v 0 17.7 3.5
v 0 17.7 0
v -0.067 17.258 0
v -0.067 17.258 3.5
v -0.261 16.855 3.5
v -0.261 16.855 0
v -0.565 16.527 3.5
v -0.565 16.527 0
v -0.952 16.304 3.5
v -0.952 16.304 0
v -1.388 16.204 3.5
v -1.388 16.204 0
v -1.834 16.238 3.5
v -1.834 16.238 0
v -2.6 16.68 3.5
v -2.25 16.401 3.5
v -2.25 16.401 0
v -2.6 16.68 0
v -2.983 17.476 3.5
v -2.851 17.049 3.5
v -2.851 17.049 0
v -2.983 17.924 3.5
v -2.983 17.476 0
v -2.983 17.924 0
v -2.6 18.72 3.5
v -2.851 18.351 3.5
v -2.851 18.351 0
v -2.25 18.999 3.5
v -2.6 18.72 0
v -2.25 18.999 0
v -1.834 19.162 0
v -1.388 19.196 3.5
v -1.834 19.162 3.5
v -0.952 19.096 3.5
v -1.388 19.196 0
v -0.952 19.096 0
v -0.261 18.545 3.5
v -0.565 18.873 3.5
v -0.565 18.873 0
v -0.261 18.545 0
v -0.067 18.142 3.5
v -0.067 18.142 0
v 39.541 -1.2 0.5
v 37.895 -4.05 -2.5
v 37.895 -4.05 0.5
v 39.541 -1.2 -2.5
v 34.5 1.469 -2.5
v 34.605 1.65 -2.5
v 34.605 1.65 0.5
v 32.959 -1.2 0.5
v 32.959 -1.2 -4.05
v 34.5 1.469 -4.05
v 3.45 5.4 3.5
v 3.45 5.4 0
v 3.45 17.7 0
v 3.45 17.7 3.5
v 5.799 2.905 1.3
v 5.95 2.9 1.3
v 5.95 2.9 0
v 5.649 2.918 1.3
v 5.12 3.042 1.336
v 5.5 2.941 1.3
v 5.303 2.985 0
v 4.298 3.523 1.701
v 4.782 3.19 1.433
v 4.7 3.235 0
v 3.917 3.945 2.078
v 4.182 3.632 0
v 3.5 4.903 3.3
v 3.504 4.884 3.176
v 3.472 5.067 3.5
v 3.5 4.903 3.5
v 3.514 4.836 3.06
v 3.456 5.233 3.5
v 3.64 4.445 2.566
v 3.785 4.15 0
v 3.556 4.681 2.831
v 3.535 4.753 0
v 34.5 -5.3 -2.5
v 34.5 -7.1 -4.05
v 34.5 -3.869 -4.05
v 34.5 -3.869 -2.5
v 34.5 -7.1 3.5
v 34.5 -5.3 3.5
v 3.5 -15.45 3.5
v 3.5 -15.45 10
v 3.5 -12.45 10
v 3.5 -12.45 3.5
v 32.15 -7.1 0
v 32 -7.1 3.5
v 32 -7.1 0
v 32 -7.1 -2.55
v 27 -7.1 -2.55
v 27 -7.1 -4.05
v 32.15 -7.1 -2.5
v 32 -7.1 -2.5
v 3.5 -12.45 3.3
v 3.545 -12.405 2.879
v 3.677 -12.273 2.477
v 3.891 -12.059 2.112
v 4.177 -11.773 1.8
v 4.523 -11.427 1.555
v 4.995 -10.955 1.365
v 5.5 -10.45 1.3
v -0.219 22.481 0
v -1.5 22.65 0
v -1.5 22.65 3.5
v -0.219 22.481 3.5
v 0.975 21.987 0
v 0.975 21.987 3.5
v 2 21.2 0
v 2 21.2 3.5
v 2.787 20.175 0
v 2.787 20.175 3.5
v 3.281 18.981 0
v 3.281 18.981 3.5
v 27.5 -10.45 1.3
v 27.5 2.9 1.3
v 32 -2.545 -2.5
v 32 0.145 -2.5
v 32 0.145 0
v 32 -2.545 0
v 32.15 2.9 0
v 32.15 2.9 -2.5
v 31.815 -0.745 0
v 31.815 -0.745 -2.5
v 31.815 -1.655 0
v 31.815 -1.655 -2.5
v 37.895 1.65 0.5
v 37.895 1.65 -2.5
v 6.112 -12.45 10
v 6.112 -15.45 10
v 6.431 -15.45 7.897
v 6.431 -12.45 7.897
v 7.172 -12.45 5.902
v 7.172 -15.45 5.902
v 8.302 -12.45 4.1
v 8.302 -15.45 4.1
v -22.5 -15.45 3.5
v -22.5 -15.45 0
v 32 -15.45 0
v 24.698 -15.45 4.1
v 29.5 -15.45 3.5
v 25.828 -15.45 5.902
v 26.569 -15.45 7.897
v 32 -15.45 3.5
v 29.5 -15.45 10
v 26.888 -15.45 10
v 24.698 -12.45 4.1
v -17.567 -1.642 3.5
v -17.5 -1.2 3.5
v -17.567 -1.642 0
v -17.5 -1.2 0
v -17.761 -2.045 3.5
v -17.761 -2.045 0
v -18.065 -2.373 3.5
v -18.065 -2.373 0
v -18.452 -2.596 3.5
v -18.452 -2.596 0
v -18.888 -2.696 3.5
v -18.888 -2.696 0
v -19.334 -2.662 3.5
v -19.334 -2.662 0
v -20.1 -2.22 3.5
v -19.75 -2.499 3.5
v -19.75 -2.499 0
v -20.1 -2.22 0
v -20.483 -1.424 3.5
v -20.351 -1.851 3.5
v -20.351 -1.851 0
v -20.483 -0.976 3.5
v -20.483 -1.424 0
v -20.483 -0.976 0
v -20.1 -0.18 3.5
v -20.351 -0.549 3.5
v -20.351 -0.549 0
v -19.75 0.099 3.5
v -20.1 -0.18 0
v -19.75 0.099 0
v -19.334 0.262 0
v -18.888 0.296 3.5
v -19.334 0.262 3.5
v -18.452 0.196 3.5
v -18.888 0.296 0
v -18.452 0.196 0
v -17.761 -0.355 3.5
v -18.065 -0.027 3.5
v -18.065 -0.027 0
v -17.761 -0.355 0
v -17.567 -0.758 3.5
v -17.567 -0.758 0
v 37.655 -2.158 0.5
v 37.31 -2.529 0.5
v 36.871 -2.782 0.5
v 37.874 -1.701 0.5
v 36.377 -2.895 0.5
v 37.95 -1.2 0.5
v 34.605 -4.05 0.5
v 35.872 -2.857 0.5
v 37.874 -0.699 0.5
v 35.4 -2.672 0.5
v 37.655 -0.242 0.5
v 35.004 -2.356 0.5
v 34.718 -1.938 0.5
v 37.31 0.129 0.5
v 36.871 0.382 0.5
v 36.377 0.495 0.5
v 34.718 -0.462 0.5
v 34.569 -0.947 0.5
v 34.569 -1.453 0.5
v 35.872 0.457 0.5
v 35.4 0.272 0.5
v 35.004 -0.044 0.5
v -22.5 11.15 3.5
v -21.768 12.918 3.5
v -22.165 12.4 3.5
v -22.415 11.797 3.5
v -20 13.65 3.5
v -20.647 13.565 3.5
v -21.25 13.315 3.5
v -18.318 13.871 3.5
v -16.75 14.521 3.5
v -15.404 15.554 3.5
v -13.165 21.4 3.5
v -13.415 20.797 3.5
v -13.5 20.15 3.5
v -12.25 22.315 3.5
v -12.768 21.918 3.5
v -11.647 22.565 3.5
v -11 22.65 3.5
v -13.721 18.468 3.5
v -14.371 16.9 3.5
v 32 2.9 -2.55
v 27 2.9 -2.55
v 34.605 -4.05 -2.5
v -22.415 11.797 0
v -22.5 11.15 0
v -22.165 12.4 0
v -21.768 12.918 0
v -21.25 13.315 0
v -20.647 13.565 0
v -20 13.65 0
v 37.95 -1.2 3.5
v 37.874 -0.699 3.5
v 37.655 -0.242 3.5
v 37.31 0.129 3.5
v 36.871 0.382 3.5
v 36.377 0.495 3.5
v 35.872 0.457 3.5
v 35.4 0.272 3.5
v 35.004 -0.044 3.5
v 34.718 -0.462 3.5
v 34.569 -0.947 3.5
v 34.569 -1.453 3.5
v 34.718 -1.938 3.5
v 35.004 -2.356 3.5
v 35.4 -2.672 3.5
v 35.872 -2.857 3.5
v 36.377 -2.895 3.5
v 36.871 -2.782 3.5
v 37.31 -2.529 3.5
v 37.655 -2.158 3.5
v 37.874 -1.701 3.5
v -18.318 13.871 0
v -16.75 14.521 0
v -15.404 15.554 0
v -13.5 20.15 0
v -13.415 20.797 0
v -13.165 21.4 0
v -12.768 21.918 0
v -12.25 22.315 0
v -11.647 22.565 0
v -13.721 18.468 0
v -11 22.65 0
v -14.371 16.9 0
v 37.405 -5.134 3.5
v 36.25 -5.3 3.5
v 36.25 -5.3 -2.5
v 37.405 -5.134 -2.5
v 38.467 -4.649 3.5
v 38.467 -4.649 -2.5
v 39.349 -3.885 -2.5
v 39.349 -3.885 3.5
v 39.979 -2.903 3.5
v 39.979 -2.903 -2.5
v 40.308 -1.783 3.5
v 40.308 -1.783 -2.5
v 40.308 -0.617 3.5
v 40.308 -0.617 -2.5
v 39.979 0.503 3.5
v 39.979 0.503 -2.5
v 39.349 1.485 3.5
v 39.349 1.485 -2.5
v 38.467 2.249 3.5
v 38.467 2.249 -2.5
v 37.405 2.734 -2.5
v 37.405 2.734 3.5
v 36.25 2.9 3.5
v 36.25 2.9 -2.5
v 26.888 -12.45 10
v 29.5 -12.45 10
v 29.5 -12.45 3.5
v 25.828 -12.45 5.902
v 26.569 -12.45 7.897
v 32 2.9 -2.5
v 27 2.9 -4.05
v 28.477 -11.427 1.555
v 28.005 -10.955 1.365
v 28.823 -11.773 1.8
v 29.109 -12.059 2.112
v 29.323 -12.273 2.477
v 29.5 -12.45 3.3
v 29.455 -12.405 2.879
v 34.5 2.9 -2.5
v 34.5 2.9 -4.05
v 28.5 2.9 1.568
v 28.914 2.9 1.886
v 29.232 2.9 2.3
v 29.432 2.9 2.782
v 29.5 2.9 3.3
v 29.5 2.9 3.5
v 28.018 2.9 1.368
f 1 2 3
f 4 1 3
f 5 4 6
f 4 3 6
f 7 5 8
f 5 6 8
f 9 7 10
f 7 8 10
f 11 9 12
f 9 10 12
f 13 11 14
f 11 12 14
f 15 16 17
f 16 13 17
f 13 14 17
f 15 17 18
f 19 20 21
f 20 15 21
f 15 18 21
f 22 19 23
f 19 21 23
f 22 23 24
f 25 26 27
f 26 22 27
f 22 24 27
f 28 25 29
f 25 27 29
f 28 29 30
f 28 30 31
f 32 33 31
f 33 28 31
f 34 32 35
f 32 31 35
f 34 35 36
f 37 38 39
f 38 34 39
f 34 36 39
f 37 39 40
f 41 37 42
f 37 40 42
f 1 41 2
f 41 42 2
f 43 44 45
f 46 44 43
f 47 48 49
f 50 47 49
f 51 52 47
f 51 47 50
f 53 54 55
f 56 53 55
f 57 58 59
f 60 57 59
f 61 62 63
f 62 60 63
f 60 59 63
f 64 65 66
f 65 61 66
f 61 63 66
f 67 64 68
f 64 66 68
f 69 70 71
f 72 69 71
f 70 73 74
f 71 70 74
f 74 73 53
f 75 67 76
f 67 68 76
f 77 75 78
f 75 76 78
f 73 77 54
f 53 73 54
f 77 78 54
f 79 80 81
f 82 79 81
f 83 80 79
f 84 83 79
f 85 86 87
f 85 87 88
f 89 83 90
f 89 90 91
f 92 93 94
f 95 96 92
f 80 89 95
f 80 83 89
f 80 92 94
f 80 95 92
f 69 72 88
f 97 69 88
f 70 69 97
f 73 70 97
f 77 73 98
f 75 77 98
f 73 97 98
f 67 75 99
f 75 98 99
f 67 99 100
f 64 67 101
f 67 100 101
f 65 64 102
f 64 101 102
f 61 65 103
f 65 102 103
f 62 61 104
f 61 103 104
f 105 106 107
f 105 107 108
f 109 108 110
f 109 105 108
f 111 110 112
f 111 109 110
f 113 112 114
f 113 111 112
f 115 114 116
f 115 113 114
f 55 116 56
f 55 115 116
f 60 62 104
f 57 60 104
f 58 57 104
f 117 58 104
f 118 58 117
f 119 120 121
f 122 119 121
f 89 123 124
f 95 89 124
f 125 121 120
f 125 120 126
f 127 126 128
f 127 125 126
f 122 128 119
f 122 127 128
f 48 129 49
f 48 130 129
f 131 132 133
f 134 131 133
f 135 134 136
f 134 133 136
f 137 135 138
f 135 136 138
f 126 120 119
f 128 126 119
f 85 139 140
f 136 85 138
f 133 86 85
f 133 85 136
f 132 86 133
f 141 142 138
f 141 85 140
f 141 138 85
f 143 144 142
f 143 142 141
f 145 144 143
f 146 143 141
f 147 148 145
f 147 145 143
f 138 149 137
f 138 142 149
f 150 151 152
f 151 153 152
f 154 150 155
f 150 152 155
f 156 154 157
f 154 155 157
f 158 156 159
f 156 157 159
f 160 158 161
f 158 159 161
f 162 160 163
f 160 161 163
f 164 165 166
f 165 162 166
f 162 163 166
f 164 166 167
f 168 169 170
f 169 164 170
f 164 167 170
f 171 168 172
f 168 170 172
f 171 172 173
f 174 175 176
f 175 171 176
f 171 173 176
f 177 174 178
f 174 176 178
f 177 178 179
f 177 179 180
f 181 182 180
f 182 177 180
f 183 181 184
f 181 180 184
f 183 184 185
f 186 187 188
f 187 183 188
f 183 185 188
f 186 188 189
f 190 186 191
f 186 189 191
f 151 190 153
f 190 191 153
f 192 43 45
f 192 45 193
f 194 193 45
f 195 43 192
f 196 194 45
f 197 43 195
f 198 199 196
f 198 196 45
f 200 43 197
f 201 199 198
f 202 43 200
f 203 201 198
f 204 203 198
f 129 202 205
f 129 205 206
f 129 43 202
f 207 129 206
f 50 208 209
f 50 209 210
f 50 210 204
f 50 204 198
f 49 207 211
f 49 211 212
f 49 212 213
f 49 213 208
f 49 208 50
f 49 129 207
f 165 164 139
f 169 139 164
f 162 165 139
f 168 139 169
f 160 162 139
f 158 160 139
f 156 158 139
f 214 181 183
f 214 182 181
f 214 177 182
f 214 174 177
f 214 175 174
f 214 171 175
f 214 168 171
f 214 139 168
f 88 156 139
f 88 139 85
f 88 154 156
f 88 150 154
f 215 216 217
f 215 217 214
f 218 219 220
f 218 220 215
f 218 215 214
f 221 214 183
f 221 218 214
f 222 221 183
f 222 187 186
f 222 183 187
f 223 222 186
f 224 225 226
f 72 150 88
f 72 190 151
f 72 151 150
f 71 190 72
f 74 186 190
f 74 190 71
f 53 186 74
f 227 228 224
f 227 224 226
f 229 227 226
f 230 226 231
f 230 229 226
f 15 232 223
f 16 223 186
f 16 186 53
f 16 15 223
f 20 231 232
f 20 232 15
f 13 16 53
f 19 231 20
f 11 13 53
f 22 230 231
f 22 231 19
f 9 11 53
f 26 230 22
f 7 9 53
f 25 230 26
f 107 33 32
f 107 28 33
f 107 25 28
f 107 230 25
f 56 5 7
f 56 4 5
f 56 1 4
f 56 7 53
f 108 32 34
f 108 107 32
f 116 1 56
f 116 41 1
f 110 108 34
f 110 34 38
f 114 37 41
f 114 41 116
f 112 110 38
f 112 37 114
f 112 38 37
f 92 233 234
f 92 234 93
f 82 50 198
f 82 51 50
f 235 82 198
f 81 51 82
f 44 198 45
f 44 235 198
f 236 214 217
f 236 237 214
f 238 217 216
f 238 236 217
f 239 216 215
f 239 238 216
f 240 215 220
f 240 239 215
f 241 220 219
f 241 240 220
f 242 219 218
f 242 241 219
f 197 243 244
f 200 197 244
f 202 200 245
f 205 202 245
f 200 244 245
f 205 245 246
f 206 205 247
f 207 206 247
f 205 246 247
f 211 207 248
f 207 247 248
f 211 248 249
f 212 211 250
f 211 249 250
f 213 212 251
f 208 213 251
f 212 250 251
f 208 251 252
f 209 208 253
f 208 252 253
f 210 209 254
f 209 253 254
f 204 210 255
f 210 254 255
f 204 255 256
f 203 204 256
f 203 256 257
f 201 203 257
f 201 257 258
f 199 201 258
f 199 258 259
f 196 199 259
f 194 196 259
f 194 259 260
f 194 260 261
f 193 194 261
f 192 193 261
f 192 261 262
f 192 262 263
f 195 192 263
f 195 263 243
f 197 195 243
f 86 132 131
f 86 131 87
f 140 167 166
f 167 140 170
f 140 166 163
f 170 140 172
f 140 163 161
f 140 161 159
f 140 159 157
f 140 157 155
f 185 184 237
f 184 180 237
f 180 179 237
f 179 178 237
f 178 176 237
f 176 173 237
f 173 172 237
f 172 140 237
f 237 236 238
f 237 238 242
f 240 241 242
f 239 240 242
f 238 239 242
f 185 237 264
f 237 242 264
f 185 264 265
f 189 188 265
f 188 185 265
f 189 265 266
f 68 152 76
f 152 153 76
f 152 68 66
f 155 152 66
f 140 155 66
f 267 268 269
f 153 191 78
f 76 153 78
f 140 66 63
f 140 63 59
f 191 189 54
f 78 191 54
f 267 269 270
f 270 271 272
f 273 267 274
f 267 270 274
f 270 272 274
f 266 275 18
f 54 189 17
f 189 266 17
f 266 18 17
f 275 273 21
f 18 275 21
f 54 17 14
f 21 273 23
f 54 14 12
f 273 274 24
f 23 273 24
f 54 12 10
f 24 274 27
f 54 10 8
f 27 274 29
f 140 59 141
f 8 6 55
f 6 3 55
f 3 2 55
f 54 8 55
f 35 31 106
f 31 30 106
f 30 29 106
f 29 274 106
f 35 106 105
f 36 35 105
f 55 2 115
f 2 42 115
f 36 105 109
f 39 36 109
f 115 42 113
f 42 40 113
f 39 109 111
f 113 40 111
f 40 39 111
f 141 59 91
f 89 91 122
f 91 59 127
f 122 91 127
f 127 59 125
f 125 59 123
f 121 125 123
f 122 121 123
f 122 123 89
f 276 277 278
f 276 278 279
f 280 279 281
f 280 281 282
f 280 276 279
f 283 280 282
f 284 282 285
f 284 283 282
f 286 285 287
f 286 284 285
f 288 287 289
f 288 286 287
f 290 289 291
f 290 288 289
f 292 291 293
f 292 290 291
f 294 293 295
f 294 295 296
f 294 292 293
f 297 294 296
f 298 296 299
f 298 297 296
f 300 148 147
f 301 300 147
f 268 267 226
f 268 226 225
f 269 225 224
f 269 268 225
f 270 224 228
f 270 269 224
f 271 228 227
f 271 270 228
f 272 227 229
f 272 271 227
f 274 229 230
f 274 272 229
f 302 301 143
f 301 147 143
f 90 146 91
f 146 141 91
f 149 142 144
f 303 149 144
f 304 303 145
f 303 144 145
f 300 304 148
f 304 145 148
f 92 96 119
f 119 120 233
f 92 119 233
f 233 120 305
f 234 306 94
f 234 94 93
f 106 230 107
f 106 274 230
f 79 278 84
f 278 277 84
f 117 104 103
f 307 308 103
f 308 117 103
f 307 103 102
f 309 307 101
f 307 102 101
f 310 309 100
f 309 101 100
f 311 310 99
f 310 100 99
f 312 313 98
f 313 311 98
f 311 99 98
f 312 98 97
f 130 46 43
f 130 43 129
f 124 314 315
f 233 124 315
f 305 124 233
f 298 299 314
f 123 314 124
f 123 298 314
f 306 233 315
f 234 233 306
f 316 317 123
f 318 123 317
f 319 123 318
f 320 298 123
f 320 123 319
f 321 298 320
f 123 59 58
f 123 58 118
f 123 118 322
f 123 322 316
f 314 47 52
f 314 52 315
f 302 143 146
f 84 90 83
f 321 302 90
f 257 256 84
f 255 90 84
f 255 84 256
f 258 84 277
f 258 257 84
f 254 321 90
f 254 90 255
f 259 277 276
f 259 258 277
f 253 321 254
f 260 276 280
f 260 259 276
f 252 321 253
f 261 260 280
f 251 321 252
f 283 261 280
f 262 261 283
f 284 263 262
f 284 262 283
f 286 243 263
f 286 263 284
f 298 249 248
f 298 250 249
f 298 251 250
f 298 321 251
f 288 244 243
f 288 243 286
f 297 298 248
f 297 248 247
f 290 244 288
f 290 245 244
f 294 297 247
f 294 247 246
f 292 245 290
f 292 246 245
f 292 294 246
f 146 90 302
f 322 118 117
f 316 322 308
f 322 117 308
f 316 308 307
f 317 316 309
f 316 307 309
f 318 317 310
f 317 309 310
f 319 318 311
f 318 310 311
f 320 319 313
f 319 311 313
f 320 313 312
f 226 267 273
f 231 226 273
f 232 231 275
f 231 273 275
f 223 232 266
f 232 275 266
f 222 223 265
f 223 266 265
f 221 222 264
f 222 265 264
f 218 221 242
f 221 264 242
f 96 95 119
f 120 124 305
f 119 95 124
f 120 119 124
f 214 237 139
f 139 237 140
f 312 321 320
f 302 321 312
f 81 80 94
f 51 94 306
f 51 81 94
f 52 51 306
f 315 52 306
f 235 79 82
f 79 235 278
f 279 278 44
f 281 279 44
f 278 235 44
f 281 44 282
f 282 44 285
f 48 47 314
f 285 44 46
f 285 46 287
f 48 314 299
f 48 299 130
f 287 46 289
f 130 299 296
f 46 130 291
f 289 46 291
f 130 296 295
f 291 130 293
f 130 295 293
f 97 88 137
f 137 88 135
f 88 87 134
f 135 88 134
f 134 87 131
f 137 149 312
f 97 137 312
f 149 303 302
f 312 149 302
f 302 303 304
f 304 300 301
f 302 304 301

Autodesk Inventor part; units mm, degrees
ref_plane "YZ Plane" through (0, 0, 0) normal (1, 0, 0) x (0, 1, 0)
ref_plane "XZ Plane" through (0, 0, 0) normal (0, 1, 0) x (-1, 0, 0)
ref_plane "XY Plane" through (0, 0, 0) normal (0, 0, 1) x (1, 0, 0)
sketch "Sketch1" plane through (0, 0, 0) normal (0, 0, 1) x (1, 0, 0)
  arc A0 (-20, 13.65) -> (-13.5, 20.15) centre (-20, 20.15) ccw
  circle A1 centre (-20, 20.15) radius 4.5 projected
  arc A2 (-20, 13.65) -> (-22.5, 11.15) centre (-20, 11.15) ccw
  line L0 (-22.5, 11.15) -> (-22.5, -15.45)
  circle A3 centre (-19, -1.2) radius 1.5 projected
  line L1 (-22.5, -15.45) -> (-15, -15.45)
  line L2 (34.5, -7.1) -> (34.5, 2.9)
  line L3 (34.5, 2.9) -> (32, 2.9)
  arc A4 (3.45, 17.7) -> (-1.5, 22.65) centre (-1.5, 17.7) ccw
  circle A5 centre (-1.5, 17.7) radius 1.5 projected
  arc A6 (-11, 22.65) -> (-13.5, 20.15) centre (-11, 20.15) ccw
  line L4 (-11, 22.65) -> (-1.5, 22.65)
  arc A7 (3.45, 5.4) -> (5.95, 2.9) centre (5.95, 5.4) ccw
  line L5 (3.45, 5.4) -> (3.45, 17.7)
  circle A8 centre (23.5, 7.6) radius 2.7 projected
  line L6 (-15, -15.45) -> (32, -15.45)
  line L7 (32, 20.05) -> (32, 2.9) construction
  line L8 (32, 2.9) -> (5.95, 2.9)
  line L9 (32, -15.45) -> (32, -7.1)
  line L10 (32, -7.1) -> (34.5, -7.1)
  point P0 (0, 0)
  point P1 (-32, -15.45)
  dimension "d0" = 90
  dimension "d1" = 90
  dimension "d2" = 2
  dimension "d3" = 3.5
  dimension "d5" = 90
  dimension "d6" = 90
  dimension "d7" = 4.7
  dimension "d51" = 2.5
  dimension "d52" = 10
extrude "Extrusion1" add sketch "Sketch1" along normal blind 3.5 contours A0 A6 L4 A4 L5 A7 L8 L3 L2 L10 L9 L6 L1 L0 A2
sketch "Sketch2" plane through (0, 0, 3.5) normal (0, 0, 1) x (1, 0, 0)
  line L0 (29.5, 12.55) -> (29.5, -12.45)
  line L1 (29.5, -12.45) -> (3.5, -12.45)
  line L2 (29.5, 12.55) -> (3.5, 12.55)
  line L3 (3.5, 12.55) -> (3.5, -12.45)
  point P0 (0, 0)
  point P1 (6.5, -20.5)
  point P2 (26.5, -20.5)
  point P3 (32, -15.45)
  dimension "d14" = 3
  dimension "d15" = 3
  dimension "d16" = 25
  dimension "d53" = 2.5
  dimension "d54" = 3
extrude "Extrusion2" cut sketch "Sketch2" against normal blind 2.2
fillet "Fillet1" radius 2 3 edges at (16.5, -12.45, 1.3) (3.5, -3.7737, 1.3) (29.5, -4.775, 1.3)
sketch "Sketch3" plane through (-15, -15.45, 0) normal (0, -1, 0) x (1, 0, 0)
  circle A0 centre (31.5, 10.5) radius 4.3 construction
  line L0 (39.5, 4.5) -> (23.5, 4.5) projected
  arc A1 (39.5, 4.5) -> (39.5, 16.5) centre (31.5, 10.5) ccw projected
  line L1 (23.5, 16.5) -> (39.5, 16.5) projected
  arc A2 (23.5, 16.5) -> (23.5, 4.5) centre (31.5, 10.5) ccw projected
  line L2 (39.6976, 16.9) -> (23.3024, 16.9) construction
  line L3 (39.6976, 4.1) -> (23.3024, 4.1)
  arc A3 (39.6976, 4.1) -> (41.888, 10) centre (31.5, 10.5) ccw
  arc A4 (23.3024, 16.9) -> (21.1, 10.5) centre (31.5, 10.5) ccw construction
  line L4 (41.9, 3.5) -> (21.1, 3.5)
  line L5 (21.1, 3.5) -> (21.1, 10.5) construction
  line L6 (41.9, 3.5) -> (41.9, 10.5) construction
  arc A5 (41.9, 10.5) -> (39.6976, 16.9) centre (31.5, 10.5) ccw construction
  arc A6 (21.1, 10.5) -> (21.112, 10) centre (31.5, 10.5) ccw construction
  line L7 (21.1, 10.5) -> (18.5, 10.5) construction
  line L8 (18.5, 10.5) -> (18.5, 10) construction
  line L9 (18.5, 3.5) -> (21.1, 3.5)
  line L10 (41.9, 10.5) -> (44.5, 10.5) construction
  line L11 (44.5, 10.5) -> (44.5, 10) construction
  line L12 (44.5, 3.5) -> (41.9, 3.5)
  line L13 (21.112, 10) -> (18.5, 10)
  line L14 (18.5, 10) -> (18.5, 3.5)
  arc A7 (21.112, 10) -> (23.3024, 4.1) centre (31.5, 10.5) ccw
  line L15 (41.888, 10) -> (44.5, 10)
  arc A8 (41.888, 10) -> (41.9, 10.5) centre (31.5, 10.5) ccw construction
  line L16 (44.5, 10) -> (44.5, 3.5)
  point P0 (15, 0)
  point P1 (19.806, 10)
  point P2 (43.194, 10)
  dimension "d22" = 0.4
  dimension "d23" = 0.4
  dimension "d55" = 6.5
extrude "Extrusion3" add sketch "Sketch3" against normal blind 3 contours A3 L15 L16 L12 L4 L9 L14 L13 A7 L3
sketch "Sketch4" plane through (0, 0, 0) normal (0, 0, -1) x (-1, 0, 0)
  line L0 (-32, -15.45) -> (-32, 20.05) projected
  line L1 (-34.5, -7.1) -> (-34.5, 2.9) projected
  line L2 (22.5, 11.15) -> (22.5, -15.45) projected
  arc A0 (22.5, 11.15) -> (20, 13.65) centre (20, 11.15) ccw projected
  arc A1 (13.5, 20.15) -> (20, 13.65) centre (20, 20.15) ccw projected
  arc A2 (13.5, 20.15) -> (11, 22.65) centre (11, 20.15) ccw projected
  line L3 (1.5, 22.65) -> (11, 22.65) projected
  arc A3 (1.5, 22.65) -> (-3.45, 17.7) centre (1.5, 17.7) ccw projected
  line L4 (-3.45, 5.4) -> (-3.45, 17.7) projected
  arc A4 (-5.95, 2.9) -> (-3.45, 5.4) centre (-5.95, 5.4) ccw projected
  line L5 (-34.5, 2.9) -> (-5.95, 2.9) projected
  line L6 (-34.5, -7.1) -> (-34.5, 2.9) projected
  line L7 (-32, -7.1) -> (-34.5, -7.1) projected
  line L8 (-32, -15.45) -> (-32, -7.1) projected
  line L9 (22.5, -15.45) -> (-32, -15.45) projected
  circle A5 centre (19, -1.2) radius 1.5 projected
  circle A6 centre (1.5, 17.7) radius 1.5 projected
  line L10 (-32, -7.1) -> (-34.5, -7.1) projected
  point P0 (0, 0)
  point P1 (-32, 2.9)
extrude "Extrusion4" add sketch "Sketch4" along normal blind 4.05 contours L7 L1 L5 L0
sketch "Sketch5" plane through (32, -15.45, 0) normal (-1, 0, 0) x (0, 0, 1)
  line L0 (-4.05, 18.35) -> (-2.55, 18.35)
  line L1 (-2.55, 18.35) -> (-2.55, 8.35)
  line L2 (-2.55, 8.35) -> (-4.05, 8.35)
  line L3 (-4.05, 8.35) -> (-4.05, 18.35)
  point P0 (0, 15.45)
  dimension "d57" = 1.5
extrude "Extrusion5" add sketch "Sketch5" along normal blind 5
sketch "Sketch8" plane through (0, 0, 3.5) normal (0, 0, 1) x (1, 0, 0)
  circle A0 centre (36.25, -1.2) radius 1.7
  arc A1 (36.25, -5.3) -> (36.25, 2.9) centre (36.25, -1.2) ccw
  line L0 (36.25, 2.9) -> (34.5, 2.9)
  line L1 (36.25, -5.3) -> (34.5, -5.3)
  arc A2 (34.5, 2.9) -> (34.5, -5.3) centre (36.25, -1.2) ccw
  point P0 (0, 0)
  dimension "d35" = 3.4
  dimension "d36" = 2.4
  dimension "d37" = 1.75
extrude "Extrusion7" add sketch "Sketch8" against normal blind 6
sketch "Sketch9" plane through (0, 0, -2.5) normal (0, 0, -1) x (-1, 0, 0)
  line L0 (-34.6046, -4.05) -> (-37.8954, -4.05)
  line L1 (-37.8954, -4.05) -> (-39.5409, -1.2)
  line L2 (-39.5409, -1.2) -> (-37.8954, 1.65)
  line L3 (-37.8954, 1.65) -> (-34.6046, 1.65)
  line L4 (-34.6046, 1.65) -> (-32.9591, -1.2)
  line L5 (-32.9591, -1.2) -> (-34.6046, -4.05)
  circle A0 centre (-36.25, -1.2) radius 1.7 projected
  point P0 (0, 0)
  point P1 (-36.25, -1.2)
  point P2 (-34.5, -2.718)
  point P3 (-34.5, -0.482)
  point P4 (-34.5, -0.4601)
  point P5 (-34.5, -1.9399)
  dimension "d42" = 5.7
extrude "Extrusion9" cut sketch "Sketch9" along normal blind 6 and the other way blind 3 contours L0 L1 L2 L3 L4 L5 | A0
sketch "Sketch10" plane through (5.95, 2.9, 1.3) normal (0, 1, 0) x (1, 0, 0)
  line L0 (26.05, 3.8) -> (26.05, 1.3) projected
  line L1 (26.2, 1.3) -> (26.2, 3.8)
  line L2 (26.2, 3.8) -> (26.05, 3.8)
  line L3 (26.05, 1.3) -> (26.2, 1.3)
  point P0 (-5.95, 1.3)
  dimension "d47" = 0.15
extrude "Extrusion10" cut sketch "Sketch10" against normal blind 10
properties part number "BACKPLATE" material "PET Plastic"
